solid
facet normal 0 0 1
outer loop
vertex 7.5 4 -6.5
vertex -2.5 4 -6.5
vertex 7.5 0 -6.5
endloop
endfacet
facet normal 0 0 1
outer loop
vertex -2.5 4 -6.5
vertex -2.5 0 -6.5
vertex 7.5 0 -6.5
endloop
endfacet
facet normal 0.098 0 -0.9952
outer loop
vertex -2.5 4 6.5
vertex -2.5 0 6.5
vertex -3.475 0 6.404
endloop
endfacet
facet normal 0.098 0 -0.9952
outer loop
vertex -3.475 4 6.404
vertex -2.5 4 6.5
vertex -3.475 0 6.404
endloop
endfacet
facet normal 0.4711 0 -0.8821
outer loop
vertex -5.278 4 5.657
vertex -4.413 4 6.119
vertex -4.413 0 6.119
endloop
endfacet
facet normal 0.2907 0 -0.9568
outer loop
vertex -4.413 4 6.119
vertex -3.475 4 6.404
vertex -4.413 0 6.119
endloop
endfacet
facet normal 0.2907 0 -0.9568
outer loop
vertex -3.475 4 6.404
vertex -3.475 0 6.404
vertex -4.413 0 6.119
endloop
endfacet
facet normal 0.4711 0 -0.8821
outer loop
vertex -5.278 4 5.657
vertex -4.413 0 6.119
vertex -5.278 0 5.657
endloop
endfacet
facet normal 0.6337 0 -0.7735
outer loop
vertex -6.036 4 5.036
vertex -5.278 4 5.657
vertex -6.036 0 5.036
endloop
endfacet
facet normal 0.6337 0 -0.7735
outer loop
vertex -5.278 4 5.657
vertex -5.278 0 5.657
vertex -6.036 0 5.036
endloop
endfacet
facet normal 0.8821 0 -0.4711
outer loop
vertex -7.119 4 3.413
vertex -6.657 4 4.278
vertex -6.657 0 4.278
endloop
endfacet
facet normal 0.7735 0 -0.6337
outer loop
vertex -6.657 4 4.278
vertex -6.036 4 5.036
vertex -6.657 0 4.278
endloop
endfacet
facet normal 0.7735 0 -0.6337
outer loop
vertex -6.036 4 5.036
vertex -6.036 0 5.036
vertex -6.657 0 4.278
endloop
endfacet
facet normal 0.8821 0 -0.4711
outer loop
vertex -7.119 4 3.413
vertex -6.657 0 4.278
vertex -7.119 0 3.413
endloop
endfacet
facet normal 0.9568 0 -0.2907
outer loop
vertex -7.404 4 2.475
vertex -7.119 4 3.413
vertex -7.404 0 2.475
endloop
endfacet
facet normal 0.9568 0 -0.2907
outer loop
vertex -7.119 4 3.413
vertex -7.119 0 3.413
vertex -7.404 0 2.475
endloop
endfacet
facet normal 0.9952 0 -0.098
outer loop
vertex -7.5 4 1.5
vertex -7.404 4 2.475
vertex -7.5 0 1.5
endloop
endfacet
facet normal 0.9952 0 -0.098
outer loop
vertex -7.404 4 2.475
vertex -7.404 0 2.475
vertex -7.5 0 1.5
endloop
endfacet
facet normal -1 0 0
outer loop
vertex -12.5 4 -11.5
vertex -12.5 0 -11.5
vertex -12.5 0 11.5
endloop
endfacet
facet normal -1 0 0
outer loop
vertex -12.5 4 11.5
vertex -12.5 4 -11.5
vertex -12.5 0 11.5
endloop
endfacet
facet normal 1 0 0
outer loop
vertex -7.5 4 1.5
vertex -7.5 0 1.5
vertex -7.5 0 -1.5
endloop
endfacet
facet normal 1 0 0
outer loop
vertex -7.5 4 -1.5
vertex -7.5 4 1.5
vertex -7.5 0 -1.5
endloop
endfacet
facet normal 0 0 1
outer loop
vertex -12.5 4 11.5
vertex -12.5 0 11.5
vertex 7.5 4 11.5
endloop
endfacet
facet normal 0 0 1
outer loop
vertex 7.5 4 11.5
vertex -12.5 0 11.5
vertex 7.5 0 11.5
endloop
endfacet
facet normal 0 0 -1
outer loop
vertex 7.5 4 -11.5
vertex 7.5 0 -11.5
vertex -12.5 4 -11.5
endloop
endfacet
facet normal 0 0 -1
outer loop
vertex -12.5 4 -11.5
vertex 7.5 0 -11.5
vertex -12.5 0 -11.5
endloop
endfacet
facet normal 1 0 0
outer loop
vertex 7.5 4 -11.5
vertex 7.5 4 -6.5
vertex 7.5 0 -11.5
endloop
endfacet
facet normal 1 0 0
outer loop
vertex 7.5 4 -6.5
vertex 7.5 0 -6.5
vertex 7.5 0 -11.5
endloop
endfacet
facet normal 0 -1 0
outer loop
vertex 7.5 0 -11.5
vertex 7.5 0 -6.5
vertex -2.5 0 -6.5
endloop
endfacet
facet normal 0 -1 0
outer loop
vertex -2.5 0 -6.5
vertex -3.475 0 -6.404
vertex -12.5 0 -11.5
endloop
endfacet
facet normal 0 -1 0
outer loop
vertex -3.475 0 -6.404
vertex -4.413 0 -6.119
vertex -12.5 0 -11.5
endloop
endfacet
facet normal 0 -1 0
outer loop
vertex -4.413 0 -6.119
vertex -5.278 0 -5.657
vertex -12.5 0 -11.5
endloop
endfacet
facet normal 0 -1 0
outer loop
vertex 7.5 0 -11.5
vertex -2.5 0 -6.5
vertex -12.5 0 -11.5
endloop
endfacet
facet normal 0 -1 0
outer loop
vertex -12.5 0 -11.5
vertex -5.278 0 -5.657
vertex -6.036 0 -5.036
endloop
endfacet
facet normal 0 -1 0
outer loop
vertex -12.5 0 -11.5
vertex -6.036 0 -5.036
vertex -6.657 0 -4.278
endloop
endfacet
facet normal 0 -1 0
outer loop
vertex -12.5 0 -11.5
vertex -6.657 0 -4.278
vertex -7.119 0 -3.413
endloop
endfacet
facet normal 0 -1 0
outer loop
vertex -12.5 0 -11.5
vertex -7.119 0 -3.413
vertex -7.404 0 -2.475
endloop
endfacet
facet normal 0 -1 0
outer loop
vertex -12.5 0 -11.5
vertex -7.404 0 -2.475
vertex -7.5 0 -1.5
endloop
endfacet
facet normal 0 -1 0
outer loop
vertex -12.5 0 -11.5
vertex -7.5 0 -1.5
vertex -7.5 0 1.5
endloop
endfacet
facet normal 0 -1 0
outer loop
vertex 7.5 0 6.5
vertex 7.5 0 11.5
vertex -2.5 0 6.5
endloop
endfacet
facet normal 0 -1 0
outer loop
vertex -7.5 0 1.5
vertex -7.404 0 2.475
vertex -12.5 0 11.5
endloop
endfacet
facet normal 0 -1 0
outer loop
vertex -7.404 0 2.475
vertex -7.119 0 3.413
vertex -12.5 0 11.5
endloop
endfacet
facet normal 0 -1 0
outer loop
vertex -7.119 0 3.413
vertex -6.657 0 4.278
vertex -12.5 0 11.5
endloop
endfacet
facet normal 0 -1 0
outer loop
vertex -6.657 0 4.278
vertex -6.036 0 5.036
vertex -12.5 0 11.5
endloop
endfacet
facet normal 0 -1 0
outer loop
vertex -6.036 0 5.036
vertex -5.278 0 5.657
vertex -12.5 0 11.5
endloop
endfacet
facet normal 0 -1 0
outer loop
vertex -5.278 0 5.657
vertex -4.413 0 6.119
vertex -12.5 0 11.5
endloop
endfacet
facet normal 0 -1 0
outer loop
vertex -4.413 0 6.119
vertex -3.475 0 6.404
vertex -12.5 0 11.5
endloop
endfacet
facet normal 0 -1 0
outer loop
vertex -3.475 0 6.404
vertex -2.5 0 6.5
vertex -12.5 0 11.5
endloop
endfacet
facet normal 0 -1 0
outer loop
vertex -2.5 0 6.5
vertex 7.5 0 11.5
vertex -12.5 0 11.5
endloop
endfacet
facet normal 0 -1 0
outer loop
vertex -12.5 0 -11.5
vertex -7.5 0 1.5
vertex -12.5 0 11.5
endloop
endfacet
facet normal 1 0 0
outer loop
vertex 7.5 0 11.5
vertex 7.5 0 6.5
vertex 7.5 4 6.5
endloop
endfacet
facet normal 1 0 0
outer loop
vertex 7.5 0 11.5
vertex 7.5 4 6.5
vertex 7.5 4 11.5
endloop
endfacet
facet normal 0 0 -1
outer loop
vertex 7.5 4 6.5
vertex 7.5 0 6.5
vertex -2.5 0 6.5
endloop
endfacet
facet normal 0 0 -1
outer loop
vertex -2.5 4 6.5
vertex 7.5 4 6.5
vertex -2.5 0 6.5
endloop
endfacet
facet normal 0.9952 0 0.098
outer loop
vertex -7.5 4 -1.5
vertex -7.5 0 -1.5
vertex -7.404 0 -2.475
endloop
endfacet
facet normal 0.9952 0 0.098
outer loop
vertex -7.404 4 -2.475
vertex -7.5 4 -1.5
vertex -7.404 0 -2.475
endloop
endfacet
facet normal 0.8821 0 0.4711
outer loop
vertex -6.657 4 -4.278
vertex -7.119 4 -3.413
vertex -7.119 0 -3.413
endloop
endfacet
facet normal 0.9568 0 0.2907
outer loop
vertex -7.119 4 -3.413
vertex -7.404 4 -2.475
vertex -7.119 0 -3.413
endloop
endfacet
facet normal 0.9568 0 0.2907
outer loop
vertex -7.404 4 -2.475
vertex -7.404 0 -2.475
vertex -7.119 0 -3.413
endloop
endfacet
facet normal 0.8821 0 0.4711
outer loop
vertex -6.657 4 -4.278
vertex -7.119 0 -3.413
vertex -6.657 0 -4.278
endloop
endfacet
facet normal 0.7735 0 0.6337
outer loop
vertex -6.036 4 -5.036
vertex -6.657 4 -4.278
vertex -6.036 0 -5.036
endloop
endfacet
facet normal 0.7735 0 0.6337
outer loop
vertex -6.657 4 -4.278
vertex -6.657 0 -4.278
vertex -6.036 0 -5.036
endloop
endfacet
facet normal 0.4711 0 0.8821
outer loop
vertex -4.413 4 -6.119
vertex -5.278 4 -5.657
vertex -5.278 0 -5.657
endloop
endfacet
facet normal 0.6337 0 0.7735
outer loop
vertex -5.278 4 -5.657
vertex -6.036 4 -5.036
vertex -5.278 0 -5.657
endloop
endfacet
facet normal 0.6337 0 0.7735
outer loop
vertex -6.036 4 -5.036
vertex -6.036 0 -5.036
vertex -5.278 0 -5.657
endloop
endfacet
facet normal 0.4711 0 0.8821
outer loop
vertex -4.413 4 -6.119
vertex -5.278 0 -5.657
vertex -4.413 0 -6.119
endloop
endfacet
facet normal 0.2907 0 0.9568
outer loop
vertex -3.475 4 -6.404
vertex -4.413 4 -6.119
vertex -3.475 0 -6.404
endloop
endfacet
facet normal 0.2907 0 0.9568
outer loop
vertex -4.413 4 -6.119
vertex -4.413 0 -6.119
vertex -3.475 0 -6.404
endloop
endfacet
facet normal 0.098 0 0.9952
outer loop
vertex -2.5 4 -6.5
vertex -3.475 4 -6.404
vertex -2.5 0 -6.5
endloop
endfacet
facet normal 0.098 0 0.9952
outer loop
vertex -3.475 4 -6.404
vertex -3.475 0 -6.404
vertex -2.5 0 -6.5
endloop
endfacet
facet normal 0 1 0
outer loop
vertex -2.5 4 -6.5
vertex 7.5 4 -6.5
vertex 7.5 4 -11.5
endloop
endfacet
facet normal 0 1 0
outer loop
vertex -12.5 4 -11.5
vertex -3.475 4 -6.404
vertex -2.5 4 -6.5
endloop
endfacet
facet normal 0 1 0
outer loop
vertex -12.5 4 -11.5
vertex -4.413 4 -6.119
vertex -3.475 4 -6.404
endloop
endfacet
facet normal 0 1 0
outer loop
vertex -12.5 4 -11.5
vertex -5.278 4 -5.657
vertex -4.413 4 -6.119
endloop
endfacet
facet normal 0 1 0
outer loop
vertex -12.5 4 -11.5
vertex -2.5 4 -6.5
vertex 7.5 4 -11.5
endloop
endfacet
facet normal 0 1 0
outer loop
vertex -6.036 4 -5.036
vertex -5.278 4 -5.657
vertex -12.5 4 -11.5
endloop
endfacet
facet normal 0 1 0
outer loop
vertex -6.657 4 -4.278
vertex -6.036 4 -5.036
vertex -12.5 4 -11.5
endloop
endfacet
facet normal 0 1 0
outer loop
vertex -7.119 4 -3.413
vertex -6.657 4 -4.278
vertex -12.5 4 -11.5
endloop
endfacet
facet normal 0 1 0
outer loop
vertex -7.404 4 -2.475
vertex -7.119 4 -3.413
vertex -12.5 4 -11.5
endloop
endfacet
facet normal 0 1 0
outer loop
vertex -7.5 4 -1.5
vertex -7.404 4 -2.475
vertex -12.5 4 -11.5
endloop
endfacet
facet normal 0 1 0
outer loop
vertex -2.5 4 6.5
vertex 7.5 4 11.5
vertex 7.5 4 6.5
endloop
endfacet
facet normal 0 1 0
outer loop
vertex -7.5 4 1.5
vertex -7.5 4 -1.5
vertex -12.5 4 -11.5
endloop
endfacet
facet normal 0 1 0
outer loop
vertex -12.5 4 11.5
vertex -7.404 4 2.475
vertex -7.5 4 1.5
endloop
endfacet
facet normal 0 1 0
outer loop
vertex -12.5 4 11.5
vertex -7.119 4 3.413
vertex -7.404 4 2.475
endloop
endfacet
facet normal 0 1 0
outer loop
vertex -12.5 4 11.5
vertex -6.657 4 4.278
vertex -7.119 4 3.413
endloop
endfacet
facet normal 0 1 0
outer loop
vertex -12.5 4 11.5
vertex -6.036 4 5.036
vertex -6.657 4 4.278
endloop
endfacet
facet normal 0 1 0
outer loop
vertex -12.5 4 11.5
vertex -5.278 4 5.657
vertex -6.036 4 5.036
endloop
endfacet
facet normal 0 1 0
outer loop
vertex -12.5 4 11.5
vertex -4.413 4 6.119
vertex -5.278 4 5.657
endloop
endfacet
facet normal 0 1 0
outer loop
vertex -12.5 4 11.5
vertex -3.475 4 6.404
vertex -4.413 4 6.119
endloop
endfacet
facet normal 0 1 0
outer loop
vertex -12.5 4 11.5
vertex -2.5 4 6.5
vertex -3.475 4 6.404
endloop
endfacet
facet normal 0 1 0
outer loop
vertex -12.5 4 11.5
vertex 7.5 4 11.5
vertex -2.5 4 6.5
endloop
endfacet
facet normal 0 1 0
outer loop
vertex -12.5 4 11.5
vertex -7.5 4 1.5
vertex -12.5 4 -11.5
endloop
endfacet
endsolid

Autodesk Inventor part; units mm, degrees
ref_plane "YZ Plane" through (0, 0, 0) normal (1, 0, 0) x (0, 1, 0)
ref_plane "XZ Plane" through (0, 0, 0) normal (0, 1, 0) x (-1, 0, 0)
ref_plane "XY Plane" through (0, 0, 0) normal (0, 0, 1) x (1, 0, 0)
sketch "Sketch1" plane through (0, 0, 0) normal (0, 1, 0) x (-1, 0, 0)
  line L0 (-7.5, 6.5) -> (2.5, 6.5)
  line L1 (7.5, 1.5) -> (7.5, -1.5)
  line L2 (2.5, -6.5) -> (-7.5, -6.5)
  line L3 (-7.5, -6.5) -> (-7.5, 6.5)
  line L4 (-7.5, 6.5) -> (7.5, -6.5) construction
  line L5 (7.5, 6.5) -> (-7.5, -6.5) construction
  line L6 (12.5, -11.5) -> (12.5, 11.5)
  line L7 (12.5, 11.5) -> (-7.5, 11.5)
  line L8 (-7.5, -11.5) -> (12.5, -11.5)
  line L9 (-7.5, 6.5) -> (-7.5, 11.5)
  line L10 (-7.5, -6.5) -> (-7.5, -11.5)
  arc A0 (7.5, 1.5) -> (2.5, 6.5) centre (2.5, 1.5) ccw
  arc A1 (2.5, -6.5) -> (7.5, -1.5) centre (2.5, -1.5) ccw
  line L11 (0, 0) -> (3.7715, 0)
  dimension "d0" = 15
  dimension "d1" = 13
  dimension "d2" = 5
  dimension "d3" = 5
  dimension "d4" = 5
extrude "Extrusion1" add sketch "Sketch1" along normal blind 4 contours L9 L7 L6 L8 L10 L2 A1 L1 A0 L0
properties part number "camera strand"
